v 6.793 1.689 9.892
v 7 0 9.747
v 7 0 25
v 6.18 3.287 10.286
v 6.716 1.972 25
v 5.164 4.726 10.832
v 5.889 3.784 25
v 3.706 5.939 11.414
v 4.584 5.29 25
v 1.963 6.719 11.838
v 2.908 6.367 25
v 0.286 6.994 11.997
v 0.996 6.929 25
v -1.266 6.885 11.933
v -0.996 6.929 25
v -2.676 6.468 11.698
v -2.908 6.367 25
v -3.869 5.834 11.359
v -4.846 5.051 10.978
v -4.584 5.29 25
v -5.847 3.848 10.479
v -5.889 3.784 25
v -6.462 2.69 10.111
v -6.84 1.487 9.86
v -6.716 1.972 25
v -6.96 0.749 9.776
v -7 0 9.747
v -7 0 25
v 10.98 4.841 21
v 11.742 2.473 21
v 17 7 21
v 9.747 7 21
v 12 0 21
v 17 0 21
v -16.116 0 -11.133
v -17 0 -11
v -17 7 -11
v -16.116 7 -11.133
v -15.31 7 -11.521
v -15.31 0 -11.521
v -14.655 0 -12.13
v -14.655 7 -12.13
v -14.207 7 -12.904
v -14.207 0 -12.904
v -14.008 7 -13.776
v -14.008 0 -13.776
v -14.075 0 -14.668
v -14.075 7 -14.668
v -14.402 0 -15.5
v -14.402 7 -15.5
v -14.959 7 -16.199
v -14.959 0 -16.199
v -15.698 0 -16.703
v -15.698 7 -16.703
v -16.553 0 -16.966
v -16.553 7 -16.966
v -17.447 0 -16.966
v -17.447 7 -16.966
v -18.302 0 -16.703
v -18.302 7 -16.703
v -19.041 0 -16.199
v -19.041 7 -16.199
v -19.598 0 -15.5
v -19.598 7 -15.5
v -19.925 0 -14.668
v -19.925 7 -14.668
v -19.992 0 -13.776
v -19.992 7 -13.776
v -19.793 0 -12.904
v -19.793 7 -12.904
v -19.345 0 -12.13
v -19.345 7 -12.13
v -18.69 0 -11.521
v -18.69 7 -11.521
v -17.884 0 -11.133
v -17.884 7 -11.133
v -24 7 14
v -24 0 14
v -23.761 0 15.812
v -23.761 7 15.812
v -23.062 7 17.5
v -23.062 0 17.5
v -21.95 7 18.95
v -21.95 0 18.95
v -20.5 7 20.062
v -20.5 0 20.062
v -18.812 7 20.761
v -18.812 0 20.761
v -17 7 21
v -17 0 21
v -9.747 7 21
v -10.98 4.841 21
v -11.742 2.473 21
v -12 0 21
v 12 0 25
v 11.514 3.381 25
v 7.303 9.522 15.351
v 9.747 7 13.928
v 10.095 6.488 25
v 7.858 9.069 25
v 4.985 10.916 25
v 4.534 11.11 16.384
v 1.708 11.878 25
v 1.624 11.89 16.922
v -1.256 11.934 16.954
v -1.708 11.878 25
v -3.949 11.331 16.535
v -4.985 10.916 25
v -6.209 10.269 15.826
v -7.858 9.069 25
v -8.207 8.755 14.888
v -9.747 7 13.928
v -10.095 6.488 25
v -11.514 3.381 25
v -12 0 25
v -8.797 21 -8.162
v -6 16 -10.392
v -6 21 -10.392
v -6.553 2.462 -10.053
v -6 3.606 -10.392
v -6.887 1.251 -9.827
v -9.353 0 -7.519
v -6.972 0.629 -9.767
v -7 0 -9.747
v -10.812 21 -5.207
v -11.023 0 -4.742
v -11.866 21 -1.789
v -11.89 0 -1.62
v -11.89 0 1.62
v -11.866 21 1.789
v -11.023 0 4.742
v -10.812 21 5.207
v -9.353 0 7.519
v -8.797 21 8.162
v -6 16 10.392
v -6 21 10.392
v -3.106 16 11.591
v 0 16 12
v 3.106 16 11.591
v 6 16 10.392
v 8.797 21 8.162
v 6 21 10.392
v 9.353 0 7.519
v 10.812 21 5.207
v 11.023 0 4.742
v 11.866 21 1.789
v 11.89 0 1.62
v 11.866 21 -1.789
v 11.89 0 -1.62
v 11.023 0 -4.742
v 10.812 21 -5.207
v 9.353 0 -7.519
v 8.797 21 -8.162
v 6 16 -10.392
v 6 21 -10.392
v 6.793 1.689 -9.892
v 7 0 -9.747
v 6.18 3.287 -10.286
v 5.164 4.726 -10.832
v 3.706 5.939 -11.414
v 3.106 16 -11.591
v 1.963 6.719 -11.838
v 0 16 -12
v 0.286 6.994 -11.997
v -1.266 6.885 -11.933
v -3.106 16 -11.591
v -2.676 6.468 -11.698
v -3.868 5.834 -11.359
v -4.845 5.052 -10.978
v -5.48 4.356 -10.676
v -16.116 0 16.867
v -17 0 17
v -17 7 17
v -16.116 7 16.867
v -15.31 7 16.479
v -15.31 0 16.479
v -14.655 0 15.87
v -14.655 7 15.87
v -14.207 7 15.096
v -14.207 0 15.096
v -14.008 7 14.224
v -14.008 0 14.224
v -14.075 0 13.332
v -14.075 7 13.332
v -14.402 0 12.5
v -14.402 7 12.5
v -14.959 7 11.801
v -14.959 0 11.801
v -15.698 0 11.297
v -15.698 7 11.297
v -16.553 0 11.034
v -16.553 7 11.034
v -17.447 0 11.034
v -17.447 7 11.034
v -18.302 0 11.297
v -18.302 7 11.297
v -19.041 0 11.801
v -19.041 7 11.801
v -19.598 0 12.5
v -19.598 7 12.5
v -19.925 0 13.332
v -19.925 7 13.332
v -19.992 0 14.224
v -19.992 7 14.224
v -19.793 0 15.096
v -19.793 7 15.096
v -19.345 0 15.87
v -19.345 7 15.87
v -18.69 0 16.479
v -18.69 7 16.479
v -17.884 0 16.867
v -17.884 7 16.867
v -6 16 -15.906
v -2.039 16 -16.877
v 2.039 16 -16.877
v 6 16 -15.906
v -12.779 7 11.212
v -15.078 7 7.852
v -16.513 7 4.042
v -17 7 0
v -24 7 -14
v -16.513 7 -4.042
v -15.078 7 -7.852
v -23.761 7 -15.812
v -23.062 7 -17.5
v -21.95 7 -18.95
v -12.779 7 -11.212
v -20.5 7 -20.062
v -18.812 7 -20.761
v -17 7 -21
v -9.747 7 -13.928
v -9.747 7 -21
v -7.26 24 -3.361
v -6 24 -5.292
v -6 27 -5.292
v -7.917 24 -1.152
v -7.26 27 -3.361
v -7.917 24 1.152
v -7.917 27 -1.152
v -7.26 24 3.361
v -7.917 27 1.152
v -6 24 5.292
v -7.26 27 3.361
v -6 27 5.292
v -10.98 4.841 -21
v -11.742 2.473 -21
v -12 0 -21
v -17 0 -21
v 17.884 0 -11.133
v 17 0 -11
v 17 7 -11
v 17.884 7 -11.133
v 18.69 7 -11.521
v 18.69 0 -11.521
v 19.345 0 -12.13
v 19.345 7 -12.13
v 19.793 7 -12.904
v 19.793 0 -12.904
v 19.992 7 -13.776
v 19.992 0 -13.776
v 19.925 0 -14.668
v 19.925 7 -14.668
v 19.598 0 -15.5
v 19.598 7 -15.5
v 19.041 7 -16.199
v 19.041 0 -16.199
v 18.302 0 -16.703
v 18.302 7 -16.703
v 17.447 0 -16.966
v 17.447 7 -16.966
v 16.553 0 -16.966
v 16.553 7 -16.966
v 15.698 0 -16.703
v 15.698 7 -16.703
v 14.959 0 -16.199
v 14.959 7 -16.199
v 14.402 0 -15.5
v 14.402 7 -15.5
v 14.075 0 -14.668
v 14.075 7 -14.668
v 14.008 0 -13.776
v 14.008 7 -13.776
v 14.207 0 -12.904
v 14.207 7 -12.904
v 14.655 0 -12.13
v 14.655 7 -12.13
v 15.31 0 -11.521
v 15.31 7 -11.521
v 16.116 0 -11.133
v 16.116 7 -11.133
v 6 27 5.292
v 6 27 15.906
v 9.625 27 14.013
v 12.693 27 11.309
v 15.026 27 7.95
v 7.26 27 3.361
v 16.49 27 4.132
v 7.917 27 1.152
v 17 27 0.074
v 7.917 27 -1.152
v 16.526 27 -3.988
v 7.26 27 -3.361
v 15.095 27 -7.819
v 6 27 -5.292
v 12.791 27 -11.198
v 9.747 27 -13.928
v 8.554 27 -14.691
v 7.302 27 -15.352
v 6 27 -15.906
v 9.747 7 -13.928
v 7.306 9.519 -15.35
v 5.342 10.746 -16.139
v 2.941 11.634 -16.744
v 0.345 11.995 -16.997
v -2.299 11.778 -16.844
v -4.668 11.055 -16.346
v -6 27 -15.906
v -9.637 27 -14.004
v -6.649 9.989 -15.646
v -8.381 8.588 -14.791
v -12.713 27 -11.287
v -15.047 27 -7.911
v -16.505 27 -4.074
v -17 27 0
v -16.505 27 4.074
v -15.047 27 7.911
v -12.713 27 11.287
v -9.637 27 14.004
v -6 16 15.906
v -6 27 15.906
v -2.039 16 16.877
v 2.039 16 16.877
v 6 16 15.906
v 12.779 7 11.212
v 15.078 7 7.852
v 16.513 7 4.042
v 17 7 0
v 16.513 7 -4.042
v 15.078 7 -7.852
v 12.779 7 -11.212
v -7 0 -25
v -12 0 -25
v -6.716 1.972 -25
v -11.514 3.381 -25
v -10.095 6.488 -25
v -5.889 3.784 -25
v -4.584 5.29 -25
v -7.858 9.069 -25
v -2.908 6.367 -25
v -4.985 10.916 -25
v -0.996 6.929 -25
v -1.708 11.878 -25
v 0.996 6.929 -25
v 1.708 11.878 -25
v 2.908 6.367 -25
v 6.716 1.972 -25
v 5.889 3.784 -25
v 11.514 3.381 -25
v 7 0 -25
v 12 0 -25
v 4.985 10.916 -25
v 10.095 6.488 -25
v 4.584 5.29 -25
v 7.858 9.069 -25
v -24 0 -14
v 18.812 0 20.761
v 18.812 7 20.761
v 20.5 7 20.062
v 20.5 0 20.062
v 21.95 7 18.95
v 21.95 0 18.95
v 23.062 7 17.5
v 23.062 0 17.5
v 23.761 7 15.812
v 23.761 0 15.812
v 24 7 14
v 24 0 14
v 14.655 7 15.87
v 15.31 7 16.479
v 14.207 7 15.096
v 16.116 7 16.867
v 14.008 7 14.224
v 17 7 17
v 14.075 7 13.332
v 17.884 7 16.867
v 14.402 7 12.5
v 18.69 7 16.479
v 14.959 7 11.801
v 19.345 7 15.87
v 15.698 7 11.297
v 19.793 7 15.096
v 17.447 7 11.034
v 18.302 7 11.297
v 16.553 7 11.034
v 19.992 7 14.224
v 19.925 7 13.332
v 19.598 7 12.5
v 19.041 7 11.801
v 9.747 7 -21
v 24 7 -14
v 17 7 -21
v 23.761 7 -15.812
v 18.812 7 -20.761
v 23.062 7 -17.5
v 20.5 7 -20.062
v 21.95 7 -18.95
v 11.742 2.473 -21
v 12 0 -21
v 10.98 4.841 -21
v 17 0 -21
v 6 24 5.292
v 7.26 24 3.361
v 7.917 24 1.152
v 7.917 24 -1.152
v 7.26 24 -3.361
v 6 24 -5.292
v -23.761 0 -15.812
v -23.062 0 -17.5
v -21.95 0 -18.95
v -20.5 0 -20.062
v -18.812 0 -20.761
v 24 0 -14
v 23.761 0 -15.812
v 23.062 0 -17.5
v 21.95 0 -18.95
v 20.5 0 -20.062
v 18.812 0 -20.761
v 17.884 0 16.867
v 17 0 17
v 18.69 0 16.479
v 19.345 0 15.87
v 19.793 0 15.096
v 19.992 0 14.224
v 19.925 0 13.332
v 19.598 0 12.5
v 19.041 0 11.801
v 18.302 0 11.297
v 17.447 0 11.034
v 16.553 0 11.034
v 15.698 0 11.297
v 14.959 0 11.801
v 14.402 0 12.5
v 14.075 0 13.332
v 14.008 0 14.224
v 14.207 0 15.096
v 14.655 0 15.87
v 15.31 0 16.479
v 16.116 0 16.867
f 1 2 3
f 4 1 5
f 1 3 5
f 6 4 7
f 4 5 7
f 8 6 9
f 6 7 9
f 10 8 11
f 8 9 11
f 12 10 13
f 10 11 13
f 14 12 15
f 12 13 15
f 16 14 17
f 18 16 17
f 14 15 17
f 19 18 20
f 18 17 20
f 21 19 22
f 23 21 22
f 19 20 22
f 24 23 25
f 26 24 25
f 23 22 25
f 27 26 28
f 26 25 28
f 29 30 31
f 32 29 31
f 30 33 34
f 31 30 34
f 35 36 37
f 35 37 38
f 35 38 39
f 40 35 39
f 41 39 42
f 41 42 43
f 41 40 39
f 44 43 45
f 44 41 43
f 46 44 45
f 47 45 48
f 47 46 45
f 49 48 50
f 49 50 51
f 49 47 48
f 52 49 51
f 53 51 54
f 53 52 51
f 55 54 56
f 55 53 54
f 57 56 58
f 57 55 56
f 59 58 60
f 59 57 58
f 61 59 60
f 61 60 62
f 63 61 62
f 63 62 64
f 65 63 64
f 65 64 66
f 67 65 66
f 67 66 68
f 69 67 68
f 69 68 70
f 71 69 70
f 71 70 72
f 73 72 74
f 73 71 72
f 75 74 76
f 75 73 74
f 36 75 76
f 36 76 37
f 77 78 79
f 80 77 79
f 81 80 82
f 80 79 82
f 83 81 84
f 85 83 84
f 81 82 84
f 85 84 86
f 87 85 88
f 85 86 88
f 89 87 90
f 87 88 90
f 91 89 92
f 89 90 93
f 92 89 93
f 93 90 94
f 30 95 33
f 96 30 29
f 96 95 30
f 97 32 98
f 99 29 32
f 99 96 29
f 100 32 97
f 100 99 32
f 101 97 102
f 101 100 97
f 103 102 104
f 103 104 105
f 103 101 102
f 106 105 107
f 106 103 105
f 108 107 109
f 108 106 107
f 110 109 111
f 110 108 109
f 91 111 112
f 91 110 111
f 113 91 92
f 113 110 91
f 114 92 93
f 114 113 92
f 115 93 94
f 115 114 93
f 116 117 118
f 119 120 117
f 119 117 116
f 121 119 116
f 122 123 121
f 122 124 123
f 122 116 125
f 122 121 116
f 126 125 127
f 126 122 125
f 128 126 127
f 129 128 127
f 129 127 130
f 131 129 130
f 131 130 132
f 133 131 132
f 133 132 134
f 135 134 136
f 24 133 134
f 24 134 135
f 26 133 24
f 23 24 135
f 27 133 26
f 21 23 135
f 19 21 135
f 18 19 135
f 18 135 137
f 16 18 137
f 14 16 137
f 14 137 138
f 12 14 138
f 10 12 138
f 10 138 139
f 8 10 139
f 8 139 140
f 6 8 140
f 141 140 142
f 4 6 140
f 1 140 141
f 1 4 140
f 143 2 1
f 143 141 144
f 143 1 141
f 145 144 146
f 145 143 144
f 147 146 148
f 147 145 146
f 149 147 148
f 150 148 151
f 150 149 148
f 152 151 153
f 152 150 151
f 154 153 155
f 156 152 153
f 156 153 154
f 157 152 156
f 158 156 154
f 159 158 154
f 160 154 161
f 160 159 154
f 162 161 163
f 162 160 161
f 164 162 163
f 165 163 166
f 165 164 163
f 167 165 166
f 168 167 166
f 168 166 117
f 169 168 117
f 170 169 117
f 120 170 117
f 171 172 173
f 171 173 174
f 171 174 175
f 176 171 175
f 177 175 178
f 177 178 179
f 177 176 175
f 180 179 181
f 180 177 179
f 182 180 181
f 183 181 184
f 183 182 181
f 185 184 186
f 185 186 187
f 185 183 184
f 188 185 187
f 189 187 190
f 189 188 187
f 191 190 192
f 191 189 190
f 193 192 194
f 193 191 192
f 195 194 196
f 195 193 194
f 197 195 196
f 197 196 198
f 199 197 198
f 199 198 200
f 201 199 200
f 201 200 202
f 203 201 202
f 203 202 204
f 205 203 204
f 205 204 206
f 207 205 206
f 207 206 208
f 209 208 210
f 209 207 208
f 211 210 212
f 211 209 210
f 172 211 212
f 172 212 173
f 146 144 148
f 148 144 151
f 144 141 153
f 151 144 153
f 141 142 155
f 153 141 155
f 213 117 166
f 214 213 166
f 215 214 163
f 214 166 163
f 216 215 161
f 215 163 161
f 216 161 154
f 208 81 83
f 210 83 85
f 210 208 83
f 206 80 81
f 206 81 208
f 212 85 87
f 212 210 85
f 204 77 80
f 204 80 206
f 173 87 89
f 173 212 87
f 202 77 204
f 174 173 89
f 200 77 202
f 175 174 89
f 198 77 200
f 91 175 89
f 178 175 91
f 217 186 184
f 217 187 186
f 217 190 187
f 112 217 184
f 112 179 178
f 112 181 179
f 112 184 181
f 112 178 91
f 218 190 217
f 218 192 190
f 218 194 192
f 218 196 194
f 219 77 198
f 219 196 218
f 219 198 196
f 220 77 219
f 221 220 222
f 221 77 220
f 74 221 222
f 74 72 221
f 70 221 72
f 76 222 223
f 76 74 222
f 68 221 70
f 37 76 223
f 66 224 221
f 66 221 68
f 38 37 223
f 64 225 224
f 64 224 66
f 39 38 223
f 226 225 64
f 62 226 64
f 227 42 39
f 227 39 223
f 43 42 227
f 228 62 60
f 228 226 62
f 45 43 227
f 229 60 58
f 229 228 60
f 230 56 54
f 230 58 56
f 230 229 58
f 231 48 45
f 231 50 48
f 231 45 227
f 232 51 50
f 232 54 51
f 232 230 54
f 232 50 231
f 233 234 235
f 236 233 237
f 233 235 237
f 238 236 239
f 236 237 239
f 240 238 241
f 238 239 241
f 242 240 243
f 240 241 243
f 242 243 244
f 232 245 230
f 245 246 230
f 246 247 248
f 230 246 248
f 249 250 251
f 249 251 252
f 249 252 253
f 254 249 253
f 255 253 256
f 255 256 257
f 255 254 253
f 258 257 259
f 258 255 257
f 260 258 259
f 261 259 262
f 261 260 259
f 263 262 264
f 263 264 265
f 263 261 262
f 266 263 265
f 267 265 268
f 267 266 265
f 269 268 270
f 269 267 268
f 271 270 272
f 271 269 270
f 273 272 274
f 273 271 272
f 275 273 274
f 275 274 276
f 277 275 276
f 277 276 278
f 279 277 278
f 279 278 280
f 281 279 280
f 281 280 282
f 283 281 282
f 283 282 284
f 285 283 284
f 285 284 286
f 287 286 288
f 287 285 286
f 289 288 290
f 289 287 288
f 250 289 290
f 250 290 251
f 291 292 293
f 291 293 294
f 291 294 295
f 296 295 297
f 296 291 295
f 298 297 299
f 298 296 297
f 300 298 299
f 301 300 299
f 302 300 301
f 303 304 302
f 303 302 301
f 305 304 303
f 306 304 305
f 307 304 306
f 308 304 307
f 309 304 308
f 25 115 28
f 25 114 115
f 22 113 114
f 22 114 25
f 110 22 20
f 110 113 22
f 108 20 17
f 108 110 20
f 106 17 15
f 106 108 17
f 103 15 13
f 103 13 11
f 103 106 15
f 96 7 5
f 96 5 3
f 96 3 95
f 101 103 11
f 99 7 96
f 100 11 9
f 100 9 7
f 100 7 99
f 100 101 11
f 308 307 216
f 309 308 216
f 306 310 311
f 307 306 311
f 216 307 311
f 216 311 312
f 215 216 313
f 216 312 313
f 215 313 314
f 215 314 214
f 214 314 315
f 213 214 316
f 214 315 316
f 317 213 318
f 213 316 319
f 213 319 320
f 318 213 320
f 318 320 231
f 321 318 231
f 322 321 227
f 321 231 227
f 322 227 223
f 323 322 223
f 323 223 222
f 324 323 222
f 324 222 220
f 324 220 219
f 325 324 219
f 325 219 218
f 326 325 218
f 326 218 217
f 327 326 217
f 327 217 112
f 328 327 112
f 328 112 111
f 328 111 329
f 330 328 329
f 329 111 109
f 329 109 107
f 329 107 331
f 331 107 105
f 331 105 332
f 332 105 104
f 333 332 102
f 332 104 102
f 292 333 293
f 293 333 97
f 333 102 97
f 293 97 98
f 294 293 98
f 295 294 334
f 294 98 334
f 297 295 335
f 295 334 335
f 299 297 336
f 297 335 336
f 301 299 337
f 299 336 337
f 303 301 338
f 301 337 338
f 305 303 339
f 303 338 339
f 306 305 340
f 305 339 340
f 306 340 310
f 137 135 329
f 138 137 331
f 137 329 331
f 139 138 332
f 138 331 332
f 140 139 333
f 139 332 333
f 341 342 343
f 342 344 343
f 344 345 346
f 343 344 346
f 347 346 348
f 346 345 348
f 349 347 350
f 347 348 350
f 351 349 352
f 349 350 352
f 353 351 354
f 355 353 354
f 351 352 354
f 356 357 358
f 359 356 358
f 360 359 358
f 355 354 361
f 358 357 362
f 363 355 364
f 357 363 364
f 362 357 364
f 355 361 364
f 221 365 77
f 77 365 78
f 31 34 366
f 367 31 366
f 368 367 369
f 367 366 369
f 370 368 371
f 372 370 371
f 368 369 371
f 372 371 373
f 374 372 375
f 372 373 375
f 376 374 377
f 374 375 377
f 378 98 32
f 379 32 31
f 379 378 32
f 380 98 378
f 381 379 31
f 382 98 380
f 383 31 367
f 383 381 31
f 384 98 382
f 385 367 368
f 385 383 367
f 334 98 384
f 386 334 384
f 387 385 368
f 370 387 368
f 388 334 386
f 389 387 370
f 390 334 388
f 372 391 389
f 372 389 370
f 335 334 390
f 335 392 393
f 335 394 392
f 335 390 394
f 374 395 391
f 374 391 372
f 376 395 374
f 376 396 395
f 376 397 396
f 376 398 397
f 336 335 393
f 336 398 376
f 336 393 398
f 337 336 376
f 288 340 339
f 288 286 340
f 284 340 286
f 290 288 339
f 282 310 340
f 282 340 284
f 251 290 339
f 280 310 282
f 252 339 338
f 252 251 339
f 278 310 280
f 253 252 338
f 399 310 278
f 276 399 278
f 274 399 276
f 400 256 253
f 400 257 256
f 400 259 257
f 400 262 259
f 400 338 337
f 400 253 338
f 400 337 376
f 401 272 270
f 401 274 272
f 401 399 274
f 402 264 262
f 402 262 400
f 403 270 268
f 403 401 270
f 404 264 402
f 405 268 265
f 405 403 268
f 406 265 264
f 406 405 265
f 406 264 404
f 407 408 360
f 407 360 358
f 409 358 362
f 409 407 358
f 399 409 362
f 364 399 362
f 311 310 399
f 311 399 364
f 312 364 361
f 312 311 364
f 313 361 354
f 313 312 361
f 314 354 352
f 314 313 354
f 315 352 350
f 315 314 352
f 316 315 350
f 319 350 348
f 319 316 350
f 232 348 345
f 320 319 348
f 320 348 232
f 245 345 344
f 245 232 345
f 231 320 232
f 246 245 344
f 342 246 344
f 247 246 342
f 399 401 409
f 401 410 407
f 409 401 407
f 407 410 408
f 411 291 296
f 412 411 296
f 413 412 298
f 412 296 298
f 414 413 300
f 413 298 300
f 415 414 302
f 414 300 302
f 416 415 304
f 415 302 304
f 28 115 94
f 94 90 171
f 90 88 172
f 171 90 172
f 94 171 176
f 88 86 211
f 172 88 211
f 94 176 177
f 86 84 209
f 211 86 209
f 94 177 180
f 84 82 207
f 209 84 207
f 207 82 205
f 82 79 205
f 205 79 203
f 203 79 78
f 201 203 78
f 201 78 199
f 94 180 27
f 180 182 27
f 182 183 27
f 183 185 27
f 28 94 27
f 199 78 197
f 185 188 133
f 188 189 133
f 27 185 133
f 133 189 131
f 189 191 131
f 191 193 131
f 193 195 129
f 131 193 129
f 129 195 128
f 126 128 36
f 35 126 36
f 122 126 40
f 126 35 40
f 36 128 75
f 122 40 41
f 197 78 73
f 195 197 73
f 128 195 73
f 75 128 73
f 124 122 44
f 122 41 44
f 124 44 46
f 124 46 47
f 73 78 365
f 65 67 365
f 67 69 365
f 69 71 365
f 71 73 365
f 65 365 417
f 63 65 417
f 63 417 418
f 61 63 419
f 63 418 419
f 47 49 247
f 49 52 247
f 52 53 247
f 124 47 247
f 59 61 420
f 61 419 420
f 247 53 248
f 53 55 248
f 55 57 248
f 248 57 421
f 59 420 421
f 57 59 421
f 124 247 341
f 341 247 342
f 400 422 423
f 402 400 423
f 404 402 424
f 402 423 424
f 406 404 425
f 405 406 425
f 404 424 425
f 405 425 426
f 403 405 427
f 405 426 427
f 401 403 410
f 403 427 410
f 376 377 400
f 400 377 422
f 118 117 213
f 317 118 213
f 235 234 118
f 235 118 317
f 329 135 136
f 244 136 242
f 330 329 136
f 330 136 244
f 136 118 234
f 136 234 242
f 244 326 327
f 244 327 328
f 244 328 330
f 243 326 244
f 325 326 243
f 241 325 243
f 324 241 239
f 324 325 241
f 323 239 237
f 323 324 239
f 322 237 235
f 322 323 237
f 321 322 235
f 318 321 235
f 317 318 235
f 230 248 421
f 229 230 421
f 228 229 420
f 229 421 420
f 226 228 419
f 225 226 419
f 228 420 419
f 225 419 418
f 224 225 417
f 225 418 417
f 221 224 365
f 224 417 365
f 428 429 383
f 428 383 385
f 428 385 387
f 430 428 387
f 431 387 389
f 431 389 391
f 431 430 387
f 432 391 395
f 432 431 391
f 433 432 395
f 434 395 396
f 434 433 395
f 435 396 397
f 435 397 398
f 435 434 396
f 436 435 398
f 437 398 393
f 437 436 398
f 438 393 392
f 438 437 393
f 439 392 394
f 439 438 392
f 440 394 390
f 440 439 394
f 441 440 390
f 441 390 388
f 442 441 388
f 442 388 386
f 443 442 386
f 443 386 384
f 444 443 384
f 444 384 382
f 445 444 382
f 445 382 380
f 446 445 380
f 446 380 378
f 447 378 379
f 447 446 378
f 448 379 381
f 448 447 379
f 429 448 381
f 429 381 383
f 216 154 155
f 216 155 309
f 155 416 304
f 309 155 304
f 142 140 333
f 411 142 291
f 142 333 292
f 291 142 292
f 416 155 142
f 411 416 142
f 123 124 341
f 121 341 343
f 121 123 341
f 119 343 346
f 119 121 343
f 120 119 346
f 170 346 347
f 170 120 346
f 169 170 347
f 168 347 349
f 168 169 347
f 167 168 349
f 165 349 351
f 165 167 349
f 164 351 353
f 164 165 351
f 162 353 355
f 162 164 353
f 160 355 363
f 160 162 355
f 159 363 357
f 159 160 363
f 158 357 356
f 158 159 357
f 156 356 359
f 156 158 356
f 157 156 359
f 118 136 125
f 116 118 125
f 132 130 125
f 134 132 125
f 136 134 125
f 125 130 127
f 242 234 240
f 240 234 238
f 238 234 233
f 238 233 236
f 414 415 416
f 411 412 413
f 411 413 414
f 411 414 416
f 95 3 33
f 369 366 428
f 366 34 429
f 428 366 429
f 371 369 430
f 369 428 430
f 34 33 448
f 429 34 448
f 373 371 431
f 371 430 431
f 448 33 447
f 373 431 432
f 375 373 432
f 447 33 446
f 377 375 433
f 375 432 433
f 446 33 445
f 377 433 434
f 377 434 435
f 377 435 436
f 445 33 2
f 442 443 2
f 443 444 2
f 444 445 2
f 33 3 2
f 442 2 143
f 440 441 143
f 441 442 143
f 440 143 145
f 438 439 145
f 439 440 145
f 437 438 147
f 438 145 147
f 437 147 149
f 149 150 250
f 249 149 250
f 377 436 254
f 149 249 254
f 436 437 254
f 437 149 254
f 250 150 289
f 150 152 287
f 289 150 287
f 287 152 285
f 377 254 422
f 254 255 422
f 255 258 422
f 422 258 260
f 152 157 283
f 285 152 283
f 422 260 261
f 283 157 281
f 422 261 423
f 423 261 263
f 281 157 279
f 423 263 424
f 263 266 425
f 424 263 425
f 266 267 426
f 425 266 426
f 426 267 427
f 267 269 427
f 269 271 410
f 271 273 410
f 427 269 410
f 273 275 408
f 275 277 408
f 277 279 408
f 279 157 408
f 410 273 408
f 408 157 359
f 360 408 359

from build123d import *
from build123d.topology import SkipClean

# Parameters (mm, degrees)
EXTRUDE_1_DEPTH     = 50
SKETCH_7_R          = 3
EXTRUDE_2_DEPTH     = 7
SKETCH_8_R          = 17
EXTRUDE_3_DEPTH     = 27
SKETCH_9_R          = 8
CUT_EXTRUDE_1_DEPTH = 3
SKETCH_11_W         = 12
SKETCH_11_H         = 11
CUT_EXTRUDE_3_DEPTH = 20
SKETCH_12_R         = 12
CUT_EXTRUDE_4_DEPTH = 21
SKETCH_13_R         = 7
CUT_EXTRUDE_5_DEPTH = 62.684682178


with BuildPart() as part:
    # 草图1 → 凸台-拉伸1 (new body)
    with BuildSketch(Plane.XY.offset(25)):
        with BuildLine():
            Line((-12, 0), (-7, 0))
            ThreePointArc((-7, 0), (0, 7), (7, 0))
            Line((7, 0), (12, 0))
            ThreePointArc((12, 0), (0, 12), (-12, 0))
        make_face()
    extrude(amount=-EXTRUDE_1_DEPTH)

    # 草图7 → 凸台-拉伸2 (add)
    with BuildSketch(Plane(origin=(0, 0, 0), x_dir=(1, 0, 0), z_dir=(0, 1, 0))):
        with BuildLine():
            Line((-17, -21), (17, -21))
            ThreePointArc((17, -21), (21.949747468, -18.949747468), (24, -14))
            Line((24, -14), (24, 14))
            ThreePointArc((24, 14), (21.949747468, 18.949747468), (17, 21))
            Line((17, 21), (-17, 21))
            ThreePointArc((-17, 21), (-21.949747468, 18.949747468), (-24, 14))
            Line((-24, 14), (-24, -14))
            ThreePointArc((-24, -14), (-21.949747468, -18.949747468), (-17, -21))
        make_face()
        with Locations((-17, 14)):
            Circle(SKETCH_7_R, mode=Mode.SUBTRACT)
        with Locations((17, 14)):
            Circle(SKETCH_7_R, mode=Mode.SUBTRACT)
        with Locations((17, -14)):
            Circle(SKETCH_7_R, mode=Mode.SUBTRACT)
        with Locations((-17, -14)):
            Circle(SKETCH_7_R, mode=Mode.SUBTRACT)
    extrude(amount=EXTRUDE_2_DEPTH)

    # 草图8 → 凸台-拉伸3 (add)
    with BuildSketch(Plane(origin=(0, 0, 0), x_dir=(1, 0, 0), z_dir=(0, 1, 0))):
        Circle(SKETCH_8_R)
    extrude(amount=EXTRUDE_3_DEPTH)

    # 草图9 → 切除-拉伸1 (cut)
    with BuildSketch(Plane(origin=(0, 27, 0), x_dir=(1, 0, 0), z_dir=(0, 1, 0))):
        Circle(SKETCH_9_R)
    extrude(amount=-CUT_EXTRUDE_1_DEPTH, mode=Mode.SUBTRACT)

    # 草图11 → 切除-拉伸3 (cut, symmetric)
    with BuildSketch(Plane.XY):
        with Locations((0, 21.5)):
            Rectangle(SKETCH_11_W, SKETCH_11_H)
    extrude(amount=CUT_EXTRUDE_3_DEPTH, both=True, mode=Mode.SUBTRACT)

    # 草图12 → 切除-拉伸4 (cut)
    with BuildSketch(Plane(origin=(0, 0, 0), x_dir=(1, 0, 0), z_dir=(0, 1, 0))):
        Circle(SKETCH_12_R)
    extrude(amount=CUT_EXTRUDE_4_DEPTH, mode=Mode.SUBTRACT)

    # 草图13 → 切除-拉伸5 (cut, through all)
    with SkipClean():  # the faces are left unmerged after this step: merging them gives an invalid solid
        with BuildSketch(Plane.XY.offset(25)):
            Circle(SKETCH_13_R)
        extrude(amount=-CUT_EXTRUDE_5_DEPTH, mode=Mode.SUBTRACT)
    add(part.part.scale(1), mode=Mode.REPLACE)  # the faces are merged on a copy


solid = part.part
